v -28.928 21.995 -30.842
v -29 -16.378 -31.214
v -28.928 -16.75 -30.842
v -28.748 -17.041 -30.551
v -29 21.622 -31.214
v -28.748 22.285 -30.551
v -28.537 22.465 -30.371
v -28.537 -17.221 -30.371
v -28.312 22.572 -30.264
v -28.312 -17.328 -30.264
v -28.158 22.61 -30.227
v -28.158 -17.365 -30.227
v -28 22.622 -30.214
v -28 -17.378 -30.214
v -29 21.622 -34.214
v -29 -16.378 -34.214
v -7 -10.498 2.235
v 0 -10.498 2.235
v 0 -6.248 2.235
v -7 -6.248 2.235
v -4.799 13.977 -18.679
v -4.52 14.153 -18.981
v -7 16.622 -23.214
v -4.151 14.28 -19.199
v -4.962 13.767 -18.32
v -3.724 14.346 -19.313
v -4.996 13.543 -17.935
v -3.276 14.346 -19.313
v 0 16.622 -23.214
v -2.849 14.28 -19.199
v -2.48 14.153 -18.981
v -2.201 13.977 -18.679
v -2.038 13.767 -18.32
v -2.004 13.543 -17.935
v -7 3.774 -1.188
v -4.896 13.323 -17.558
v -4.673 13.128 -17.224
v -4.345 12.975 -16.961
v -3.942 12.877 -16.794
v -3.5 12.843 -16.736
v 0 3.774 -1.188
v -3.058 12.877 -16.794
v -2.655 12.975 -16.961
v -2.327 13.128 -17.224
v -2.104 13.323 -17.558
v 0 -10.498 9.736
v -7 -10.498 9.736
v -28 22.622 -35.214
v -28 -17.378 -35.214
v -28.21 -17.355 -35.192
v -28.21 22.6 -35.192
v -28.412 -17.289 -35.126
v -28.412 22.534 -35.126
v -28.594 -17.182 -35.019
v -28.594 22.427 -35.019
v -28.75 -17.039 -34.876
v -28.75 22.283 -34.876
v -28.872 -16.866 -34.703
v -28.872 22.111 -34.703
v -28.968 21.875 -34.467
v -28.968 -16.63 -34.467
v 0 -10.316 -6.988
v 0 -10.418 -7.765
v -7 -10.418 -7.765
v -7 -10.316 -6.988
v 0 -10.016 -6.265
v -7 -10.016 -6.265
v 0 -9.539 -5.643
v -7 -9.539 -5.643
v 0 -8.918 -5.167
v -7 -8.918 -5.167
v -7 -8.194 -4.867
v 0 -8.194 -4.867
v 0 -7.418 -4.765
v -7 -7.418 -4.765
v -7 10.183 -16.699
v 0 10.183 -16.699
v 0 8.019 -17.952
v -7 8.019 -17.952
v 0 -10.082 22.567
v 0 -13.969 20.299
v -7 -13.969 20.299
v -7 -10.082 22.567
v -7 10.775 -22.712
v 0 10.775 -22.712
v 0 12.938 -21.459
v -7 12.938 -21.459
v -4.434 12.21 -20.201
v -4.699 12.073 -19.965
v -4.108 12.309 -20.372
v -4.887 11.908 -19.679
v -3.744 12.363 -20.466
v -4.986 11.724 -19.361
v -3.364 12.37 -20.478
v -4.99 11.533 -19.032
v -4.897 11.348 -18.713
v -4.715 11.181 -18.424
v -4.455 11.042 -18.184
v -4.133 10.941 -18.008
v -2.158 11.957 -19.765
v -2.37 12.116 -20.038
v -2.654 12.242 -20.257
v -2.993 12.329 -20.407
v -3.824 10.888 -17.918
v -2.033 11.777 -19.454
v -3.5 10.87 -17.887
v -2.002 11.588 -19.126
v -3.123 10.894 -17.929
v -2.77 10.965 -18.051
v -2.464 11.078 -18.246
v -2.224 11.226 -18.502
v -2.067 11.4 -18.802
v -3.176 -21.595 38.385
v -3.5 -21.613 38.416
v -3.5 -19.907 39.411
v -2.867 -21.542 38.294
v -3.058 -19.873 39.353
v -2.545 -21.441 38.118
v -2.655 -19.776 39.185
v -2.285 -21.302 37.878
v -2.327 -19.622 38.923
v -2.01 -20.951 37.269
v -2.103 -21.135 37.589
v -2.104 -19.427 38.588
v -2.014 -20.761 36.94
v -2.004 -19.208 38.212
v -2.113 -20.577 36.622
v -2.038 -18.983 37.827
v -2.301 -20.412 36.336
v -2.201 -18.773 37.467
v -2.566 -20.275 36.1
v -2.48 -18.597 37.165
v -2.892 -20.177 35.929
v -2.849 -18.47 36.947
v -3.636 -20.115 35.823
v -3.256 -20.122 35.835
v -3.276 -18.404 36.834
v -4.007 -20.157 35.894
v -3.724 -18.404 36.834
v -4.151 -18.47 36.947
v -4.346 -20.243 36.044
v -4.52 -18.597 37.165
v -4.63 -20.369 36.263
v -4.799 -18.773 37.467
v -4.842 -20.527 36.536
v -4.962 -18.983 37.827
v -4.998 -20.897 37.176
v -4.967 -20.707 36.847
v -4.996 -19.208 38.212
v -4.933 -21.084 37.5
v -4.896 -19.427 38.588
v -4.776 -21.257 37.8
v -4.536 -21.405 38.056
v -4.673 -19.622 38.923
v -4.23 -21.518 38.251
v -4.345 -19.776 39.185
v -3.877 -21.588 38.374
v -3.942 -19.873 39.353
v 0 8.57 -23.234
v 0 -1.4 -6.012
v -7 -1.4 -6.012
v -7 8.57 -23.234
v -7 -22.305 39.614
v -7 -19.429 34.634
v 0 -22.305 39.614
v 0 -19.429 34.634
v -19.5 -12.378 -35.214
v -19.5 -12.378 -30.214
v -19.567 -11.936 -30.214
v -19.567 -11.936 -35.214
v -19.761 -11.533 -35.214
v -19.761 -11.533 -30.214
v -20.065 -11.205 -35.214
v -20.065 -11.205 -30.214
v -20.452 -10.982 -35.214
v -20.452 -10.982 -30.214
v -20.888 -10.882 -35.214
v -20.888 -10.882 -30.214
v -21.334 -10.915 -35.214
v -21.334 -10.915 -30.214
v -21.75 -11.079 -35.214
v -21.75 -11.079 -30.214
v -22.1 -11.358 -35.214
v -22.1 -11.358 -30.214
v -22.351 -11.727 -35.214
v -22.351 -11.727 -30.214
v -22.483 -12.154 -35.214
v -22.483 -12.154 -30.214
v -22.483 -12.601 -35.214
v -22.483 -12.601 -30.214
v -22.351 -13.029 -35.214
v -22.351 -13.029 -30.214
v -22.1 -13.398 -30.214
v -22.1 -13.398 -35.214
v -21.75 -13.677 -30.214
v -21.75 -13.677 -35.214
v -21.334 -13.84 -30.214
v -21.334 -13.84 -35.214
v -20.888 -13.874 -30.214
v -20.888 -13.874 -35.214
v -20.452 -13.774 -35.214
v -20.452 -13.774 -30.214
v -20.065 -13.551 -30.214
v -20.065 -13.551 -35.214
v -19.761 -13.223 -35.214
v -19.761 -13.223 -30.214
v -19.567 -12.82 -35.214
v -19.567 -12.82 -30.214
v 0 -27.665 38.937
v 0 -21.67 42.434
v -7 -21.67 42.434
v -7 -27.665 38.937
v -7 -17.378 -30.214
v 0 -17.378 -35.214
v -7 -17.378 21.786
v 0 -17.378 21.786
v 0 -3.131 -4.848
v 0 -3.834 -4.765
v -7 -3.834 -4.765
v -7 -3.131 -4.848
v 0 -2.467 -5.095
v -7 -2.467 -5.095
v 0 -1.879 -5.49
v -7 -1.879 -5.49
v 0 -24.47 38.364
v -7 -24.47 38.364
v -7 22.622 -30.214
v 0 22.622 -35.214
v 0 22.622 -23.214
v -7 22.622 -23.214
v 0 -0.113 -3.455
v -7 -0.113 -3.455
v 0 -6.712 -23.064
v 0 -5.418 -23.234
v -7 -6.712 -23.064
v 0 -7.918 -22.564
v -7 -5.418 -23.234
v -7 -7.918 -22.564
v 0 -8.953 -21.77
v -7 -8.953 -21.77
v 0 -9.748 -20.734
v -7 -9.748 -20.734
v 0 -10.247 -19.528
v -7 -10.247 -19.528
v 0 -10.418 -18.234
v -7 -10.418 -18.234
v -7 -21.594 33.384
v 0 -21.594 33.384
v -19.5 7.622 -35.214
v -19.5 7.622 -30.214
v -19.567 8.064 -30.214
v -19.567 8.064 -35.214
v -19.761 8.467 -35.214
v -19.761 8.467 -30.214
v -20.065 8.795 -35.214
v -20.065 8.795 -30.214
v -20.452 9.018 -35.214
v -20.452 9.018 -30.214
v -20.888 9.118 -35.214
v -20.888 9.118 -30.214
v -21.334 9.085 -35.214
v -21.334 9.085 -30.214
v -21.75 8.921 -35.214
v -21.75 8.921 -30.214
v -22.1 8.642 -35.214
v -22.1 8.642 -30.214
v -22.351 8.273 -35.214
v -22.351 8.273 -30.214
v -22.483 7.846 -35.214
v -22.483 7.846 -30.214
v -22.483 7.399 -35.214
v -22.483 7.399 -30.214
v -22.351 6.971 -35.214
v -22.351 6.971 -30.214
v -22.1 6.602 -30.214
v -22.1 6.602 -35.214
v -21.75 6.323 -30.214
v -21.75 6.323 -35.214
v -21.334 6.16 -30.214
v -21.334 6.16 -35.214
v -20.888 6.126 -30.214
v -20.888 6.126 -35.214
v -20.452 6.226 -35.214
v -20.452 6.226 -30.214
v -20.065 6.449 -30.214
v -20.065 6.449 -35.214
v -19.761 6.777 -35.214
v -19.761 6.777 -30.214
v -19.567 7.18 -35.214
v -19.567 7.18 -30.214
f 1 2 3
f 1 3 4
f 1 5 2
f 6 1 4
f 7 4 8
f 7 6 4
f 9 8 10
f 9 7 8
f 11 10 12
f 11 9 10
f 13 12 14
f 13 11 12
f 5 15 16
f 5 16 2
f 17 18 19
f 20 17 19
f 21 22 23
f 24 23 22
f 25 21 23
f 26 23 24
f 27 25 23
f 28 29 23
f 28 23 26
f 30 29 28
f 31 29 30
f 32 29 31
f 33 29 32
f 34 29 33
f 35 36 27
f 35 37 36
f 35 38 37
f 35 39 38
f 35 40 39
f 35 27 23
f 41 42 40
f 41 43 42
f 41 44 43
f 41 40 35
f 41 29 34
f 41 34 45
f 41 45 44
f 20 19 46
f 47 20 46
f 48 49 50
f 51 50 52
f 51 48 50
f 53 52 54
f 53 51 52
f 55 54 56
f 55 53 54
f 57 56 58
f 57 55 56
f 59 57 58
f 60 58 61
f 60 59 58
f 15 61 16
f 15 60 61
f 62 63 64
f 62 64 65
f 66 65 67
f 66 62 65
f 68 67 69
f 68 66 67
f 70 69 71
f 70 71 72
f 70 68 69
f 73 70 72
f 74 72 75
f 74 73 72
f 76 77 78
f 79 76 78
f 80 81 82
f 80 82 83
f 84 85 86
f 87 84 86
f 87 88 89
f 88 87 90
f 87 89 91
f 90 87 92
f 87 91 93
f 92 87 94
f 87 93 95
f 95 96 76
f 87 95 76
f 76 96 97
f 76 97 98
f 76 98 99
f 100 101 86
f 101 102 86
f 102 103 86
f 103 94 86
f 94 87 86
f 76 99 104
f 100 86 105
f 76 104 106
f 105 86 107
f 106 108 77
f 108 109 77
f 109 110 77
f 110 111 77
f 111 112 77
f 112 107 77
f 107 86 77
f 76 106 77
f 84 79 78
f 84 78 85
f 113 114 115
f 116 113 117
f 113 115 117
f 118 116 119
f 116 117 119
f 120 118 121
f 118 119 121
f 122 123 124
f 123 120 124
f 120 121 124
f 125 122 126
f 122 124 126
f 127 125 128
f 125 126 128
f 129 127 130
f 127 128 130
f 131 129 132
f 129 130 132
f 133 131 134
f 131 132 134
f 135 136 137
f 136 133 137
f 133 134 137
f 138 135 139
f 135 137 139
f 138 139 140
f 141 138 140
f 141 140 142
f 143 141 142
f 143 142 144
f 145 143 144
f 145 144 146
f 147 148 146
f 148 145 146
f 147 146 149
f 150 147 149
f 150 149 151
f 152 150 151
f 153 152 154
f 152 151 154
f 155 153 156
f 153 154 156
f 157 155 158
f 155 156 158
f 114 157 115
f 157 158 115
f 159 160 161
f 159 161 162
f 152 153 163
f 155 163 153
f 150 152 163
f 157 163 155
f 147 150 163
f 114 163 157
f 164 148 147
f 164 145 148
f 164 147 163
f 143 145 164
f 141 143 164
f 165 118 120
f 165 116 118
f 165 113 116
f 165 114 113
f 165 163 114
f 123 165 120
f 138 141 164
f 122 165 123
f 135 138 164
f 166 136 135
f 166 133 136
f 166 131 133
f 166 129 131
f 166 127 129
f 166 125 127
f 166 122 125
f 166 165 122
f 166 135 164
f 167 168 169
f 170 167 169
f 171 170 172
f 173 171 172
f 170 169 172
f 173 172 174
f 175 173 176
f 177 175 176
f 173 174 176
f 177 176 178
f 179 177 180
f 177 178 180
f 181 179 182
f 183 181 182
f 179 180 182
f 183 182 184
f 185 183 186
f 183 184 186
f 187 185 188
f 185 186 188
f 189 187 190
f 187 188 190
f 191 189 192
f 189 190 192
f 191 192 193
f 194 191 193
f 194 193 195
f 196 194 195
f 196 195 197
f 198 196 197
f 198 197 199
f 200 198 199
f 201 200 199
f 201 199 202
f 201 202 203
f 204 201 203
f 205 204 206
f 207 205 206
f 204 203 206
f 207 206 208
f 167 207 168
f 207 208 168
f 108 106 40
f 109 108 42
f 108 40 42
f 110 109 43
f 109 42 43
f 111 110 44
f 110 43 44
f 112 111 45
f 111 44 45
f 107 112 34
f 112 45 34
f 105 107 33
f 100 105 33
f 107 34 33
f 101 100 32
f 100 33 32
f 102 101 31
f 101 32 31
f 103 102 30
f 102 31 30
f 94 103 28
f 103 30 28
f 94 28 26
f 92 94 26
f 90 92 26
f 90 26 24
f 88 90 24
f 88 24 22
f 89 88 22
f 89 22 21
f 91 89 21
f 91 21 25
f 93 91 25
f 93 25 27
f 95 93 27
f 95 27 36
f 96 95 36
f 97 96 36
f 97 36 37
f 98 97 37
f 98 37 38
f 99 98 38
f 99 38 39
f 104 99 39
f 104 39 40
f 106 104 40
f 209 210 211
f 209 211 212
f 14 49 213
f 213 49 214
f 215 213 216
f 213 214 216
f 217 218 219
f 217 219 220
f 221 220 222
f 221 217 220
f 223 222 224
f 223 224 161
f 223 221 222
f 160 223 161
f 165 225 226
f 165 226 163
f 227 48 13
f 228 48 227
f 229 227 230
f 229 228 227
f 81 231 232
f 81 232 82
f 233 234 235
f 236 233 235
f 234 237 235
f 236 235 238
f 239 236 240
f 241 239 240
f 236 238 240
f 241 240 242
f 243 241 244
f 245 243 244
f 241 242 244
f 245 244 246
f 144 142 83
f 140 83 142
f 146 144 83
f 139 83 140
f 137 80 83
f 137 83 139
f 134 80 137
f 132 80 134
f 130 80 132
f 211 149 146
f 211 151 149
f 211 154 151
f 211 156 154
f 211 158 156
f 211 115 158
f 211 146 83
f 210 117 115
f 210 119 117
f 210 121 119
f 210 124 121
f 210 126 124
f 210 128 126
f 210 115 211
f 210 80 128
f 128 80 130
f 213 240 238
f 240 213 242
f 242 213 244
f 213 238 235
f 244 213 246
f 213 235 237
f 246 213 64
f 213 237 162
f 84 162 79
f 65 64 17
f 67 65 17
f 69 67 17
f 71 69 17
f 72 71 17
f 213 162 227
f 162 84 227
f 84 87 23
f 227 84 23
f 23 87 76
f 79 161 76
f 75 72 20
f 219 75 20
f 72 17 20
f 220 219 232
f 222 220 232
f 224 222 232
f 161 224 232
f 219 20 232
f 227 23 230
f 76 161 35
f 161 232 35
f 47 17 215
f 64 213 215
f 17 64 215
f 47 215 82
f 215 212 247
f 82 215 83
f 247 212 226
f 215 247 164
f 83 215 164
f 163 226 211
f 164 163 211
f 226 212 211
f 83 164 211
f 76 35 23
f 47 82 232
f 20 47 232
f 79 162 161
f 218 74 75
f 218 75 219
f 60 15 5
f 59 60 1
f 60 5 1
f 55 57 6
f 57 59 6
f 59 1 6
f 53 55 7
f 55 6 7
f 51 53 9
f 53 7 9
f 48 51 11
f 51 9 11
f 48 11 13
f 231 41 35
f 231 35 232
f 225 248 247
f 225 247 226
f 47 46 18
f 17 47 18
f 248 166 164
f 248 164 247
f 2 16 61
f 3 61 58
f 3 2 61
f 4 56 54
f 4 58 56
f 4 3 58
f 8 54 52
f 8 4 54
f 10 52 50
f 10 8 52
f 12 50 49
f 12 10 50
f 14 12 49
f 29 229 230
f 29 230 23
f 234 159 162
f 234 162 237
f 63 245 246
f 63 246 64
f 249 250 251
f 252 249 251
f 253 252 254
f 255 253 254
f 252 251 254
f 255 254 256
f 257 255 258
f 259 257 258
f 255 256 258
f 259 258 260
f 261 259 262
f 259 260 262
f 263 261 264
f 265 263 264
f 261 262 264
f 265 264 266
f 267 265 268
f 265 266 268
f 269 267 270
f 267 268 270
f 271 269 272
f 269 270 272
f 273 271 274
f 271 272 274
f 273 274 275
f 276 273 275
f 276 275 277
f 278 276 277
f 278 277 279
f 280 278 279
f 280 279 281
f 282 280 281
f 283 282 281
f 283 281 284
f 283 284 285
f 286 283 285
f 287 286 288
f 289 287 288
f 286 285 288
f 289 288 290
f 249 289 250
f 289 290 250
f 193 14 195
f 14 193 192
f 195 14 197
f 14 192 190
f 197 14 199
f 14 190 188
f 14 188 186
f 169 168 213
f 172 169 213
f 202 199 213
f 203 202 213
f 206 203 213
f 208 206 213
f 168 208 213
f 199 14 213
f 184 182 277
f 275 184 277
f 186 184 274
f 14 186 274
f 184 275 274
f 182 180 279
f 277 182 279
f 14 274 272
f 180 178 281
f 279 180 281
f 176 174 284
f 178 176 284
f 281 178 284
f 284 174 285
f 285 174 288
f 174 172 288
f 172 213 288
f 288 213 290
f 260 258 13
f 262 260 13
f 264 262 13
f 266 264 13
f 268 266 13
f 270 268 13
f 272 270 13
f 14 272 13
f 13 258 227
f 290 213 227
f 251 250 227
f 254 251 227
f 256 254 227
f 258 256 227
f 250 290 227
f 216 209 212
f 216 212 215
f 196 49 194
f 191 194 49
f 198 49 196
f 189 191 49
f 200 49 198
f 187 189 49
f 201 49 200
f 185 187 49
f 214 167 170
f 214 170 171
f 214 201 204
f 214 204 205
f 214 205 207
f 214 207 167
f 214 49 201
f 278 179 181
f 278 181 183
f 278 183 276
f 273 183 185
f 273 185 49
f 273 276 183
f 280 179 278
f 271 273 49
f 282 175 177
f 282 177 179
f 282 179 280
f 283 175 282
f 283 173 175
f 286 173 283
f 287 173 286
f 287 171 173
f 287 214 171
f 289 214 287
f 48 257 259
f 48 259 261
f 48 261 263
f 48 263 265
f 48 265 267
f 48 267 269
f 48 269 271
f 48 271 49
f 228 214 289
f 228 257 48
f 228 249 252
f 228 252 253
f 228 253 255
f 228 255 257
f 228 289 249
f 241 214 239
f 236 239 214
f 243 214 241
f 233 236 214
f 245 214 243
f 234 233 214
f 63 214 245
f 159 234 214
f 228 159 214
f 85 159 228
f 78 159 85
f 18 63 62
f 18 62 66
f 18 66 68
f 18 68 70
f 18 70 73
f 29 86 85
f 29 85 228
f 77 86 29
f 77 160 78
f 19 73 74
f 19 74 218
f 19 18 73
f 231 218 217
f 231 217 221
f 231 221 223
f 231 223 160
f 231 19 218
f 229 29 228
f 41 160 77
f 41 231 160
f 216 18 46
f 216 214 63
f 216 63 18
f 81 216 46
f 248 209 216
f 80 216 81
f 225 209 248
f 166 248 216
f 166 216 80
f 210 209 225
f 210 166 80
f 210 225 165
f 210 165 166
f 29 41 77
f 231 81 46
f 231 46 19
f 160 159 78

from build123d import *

# Parameters (mm, degrees)
BOSS_EXTRUDE1_DEPTH = 7
FILLET1_R           = 3
FILLET2_R           = 5
SKETCH2_W           = 5
SKETCH2_H           = 40
BOSS_EXTRUDE2_DEPTH = 22
SKETCH4_R           = 1.5
CUT_EXTRUDE1_DEPTH  = 3
SKETCH5_R           = 1.5
CUT_EXTRUDE2_DEPTH  = 5
FILLET3_R           = 1


with BuildPart() as part:
    # Sketch1 → Boss-Extrude1 (new body)
    with BuildSketch(Plane(origin=(0, 0, 0), x_dir=(0, 0, -1), z_dir=(1, 0, 0))):
        Polygon((-21.785617828, -17.377868865), (35.214382172, -17.377868865), (35.214382172, 22.622131135), (23.214382172, 22.622131135), (23.214382172, 16.622131135), (1.187686697, 3.773991719), (3.455005417, -0.113072189), (-20.299274017, -13.968908814), (-22.566592737, -10.081844907), (-42.433808264, -21.670362811), (-38.937098948, -27.665079148), align=None)
        Polygon((23.234116709, 8.569586546), (23.234116709, -10.417868865), (4.764740561, -10.417868865), (4.764740561, -1.399885987), (6.011600394, -1.399885987), align=None, mode=Mode.SUBTRACT)
        Polygon((-39.613886954, -22.304550046), (-34.634489281, -19.42911985), (-33.384302239, -21.59407536), (-38.363699913, -24.469505556), align=None, mode=Mode.SUBTRACT)
        Polygon((-9.735540794, -10.497868865), (-2.235259439, -10.497868865), (-2.235259439, -6.248372162), align=None, mode=Mode.SUBTRACT)
        Polygon((16.699385829, 10.182861543), (17.951839541, 8.019216032), (22.7118599, 10.774614335), (21.459406188, 12.938259845), align=None, mode=Mode.SUBTRACT)
    extrude(amount=-BOSS_EXTRUDE1_DEPTH)

    # Fillet1
    # the kernel refuses this fillet: 3 mm, written as the material it adds along each edge
    with BuildSketch(Plane(origin=(0, -10.417868865, -4.764740561), x_dir=(0, 0, -1), z_dir=(-1, 0, 0))) as fillet1_piece_1:
        with BuildLine():
            CenterArc((FILLET1_R, -FILLET1_R), FILLET1_R, 90, 90)
            Line((0, -FILLET1_R), (-FILLET1_R * 0.02, -FILLET1_R))
            Line((-FILLET1_R * 0.02, -FILLET1_R), (-FILLET1_R * 0.02, FILLET1_R * 0.02))
            Line((-FILLET1_R * 0.02, FILLET1_R * 0.02), (FILLET1_R, FILLET1_R * 0.02))
            Line((FILLET1_R, FILLET1_R * 0.02), (FILLET1_R, 0))
        make_face()
    extrude(amount=7)
    with BuildSketch(Plane(origin=(0, -1.399885987, -4.764740561), x_dir=(0, -1, 0), z_dir=(-1, 0, 0))) as fillet1_piece_2:
        with BuildLine():
            CenterArc((2.434440295, -3), FILLET1_R, 90, 54.240794128)
            Line((0, -1.246859832), (-0.048688806, -1.211797029))
            ThreePointArc((-0.048688806, -1.211797029), (-0.06, -0.623429916), (-0.06, 0))
            Line((-0.06, 0), (0, 0.06))
            Line((0, 0.06), (2.434440295, 0.06))
            Line((2.434440295, 0.06), (2.434440295, 0))
        make_face()
    extrude(amount=7)

    # Fillet2
    fillet2_edges = [part.edges().sort_by_distance(p)[0] for p in [
        (-3.5, -10.417868865, -23.234116709),
    ]]
    fillet(fillet2_edges, radius=FILLET2_R)

    # Sketch2 → Boss-Extrude2 (add)
    with BuildSketch(Plane.ZY.offset(7)):
        with Locations((-32.714382172, 2.622131135)):
            Rectangle(SKETCH2_W, SKETCH2_H)
    extrude(amount=BOSS_EXTRUDE2_DEPTH)

    # Sketch4 → Cut-Extrude1 (cut)
    with BuildSketch(Plane(origin=(0, 2.299007828, 1.341007921), x_dir=(1, 0, 0), z_dir=(0, 0.8637919794098133, 0.5038486045502921))):
        with Locations(Location((-3.5, 22.427434704, 0), (0, 0, 270))):
            Circle(SKETCH4_R)
        with Locations(Location((-3.5, -42.572565296, 0), (0, 0, 270))):
            Circle(SKETCH4_R)
    extrude(amount=-CUT_EXTRUDE1_DEPTH, mode=Mode.SUBTRACT)

    # Sketch5 → Cut-Extrude2 (cut)
    with BuildSketch(Plane.XY.offset(-30.214382172)):
        with Locations((-21, 7.622131135)):
            Circle(SKETCH5_R)
        with Locations((-21, -12.377868865)):
            Circle(SKETCH5_R)
    extrude(amount=-CUT_EXTRUDE2_DEPTH, mode=Mode.SUBTRACT)

    # Fillet3
    fillet3_edges = [part.edges().sort_by_distance(p)[0] for p in [
        (-29, 2.622131135, -35.214382172),
        (-29, -17.377868865, -32.714382172),
        (-29, 2.622131135, -30.214382172),
        (-29, 22.622131135, -32.714382172),
    ]]
    fillet(fillet3_edges, radius=FILLET3_R)


solid = part.part
